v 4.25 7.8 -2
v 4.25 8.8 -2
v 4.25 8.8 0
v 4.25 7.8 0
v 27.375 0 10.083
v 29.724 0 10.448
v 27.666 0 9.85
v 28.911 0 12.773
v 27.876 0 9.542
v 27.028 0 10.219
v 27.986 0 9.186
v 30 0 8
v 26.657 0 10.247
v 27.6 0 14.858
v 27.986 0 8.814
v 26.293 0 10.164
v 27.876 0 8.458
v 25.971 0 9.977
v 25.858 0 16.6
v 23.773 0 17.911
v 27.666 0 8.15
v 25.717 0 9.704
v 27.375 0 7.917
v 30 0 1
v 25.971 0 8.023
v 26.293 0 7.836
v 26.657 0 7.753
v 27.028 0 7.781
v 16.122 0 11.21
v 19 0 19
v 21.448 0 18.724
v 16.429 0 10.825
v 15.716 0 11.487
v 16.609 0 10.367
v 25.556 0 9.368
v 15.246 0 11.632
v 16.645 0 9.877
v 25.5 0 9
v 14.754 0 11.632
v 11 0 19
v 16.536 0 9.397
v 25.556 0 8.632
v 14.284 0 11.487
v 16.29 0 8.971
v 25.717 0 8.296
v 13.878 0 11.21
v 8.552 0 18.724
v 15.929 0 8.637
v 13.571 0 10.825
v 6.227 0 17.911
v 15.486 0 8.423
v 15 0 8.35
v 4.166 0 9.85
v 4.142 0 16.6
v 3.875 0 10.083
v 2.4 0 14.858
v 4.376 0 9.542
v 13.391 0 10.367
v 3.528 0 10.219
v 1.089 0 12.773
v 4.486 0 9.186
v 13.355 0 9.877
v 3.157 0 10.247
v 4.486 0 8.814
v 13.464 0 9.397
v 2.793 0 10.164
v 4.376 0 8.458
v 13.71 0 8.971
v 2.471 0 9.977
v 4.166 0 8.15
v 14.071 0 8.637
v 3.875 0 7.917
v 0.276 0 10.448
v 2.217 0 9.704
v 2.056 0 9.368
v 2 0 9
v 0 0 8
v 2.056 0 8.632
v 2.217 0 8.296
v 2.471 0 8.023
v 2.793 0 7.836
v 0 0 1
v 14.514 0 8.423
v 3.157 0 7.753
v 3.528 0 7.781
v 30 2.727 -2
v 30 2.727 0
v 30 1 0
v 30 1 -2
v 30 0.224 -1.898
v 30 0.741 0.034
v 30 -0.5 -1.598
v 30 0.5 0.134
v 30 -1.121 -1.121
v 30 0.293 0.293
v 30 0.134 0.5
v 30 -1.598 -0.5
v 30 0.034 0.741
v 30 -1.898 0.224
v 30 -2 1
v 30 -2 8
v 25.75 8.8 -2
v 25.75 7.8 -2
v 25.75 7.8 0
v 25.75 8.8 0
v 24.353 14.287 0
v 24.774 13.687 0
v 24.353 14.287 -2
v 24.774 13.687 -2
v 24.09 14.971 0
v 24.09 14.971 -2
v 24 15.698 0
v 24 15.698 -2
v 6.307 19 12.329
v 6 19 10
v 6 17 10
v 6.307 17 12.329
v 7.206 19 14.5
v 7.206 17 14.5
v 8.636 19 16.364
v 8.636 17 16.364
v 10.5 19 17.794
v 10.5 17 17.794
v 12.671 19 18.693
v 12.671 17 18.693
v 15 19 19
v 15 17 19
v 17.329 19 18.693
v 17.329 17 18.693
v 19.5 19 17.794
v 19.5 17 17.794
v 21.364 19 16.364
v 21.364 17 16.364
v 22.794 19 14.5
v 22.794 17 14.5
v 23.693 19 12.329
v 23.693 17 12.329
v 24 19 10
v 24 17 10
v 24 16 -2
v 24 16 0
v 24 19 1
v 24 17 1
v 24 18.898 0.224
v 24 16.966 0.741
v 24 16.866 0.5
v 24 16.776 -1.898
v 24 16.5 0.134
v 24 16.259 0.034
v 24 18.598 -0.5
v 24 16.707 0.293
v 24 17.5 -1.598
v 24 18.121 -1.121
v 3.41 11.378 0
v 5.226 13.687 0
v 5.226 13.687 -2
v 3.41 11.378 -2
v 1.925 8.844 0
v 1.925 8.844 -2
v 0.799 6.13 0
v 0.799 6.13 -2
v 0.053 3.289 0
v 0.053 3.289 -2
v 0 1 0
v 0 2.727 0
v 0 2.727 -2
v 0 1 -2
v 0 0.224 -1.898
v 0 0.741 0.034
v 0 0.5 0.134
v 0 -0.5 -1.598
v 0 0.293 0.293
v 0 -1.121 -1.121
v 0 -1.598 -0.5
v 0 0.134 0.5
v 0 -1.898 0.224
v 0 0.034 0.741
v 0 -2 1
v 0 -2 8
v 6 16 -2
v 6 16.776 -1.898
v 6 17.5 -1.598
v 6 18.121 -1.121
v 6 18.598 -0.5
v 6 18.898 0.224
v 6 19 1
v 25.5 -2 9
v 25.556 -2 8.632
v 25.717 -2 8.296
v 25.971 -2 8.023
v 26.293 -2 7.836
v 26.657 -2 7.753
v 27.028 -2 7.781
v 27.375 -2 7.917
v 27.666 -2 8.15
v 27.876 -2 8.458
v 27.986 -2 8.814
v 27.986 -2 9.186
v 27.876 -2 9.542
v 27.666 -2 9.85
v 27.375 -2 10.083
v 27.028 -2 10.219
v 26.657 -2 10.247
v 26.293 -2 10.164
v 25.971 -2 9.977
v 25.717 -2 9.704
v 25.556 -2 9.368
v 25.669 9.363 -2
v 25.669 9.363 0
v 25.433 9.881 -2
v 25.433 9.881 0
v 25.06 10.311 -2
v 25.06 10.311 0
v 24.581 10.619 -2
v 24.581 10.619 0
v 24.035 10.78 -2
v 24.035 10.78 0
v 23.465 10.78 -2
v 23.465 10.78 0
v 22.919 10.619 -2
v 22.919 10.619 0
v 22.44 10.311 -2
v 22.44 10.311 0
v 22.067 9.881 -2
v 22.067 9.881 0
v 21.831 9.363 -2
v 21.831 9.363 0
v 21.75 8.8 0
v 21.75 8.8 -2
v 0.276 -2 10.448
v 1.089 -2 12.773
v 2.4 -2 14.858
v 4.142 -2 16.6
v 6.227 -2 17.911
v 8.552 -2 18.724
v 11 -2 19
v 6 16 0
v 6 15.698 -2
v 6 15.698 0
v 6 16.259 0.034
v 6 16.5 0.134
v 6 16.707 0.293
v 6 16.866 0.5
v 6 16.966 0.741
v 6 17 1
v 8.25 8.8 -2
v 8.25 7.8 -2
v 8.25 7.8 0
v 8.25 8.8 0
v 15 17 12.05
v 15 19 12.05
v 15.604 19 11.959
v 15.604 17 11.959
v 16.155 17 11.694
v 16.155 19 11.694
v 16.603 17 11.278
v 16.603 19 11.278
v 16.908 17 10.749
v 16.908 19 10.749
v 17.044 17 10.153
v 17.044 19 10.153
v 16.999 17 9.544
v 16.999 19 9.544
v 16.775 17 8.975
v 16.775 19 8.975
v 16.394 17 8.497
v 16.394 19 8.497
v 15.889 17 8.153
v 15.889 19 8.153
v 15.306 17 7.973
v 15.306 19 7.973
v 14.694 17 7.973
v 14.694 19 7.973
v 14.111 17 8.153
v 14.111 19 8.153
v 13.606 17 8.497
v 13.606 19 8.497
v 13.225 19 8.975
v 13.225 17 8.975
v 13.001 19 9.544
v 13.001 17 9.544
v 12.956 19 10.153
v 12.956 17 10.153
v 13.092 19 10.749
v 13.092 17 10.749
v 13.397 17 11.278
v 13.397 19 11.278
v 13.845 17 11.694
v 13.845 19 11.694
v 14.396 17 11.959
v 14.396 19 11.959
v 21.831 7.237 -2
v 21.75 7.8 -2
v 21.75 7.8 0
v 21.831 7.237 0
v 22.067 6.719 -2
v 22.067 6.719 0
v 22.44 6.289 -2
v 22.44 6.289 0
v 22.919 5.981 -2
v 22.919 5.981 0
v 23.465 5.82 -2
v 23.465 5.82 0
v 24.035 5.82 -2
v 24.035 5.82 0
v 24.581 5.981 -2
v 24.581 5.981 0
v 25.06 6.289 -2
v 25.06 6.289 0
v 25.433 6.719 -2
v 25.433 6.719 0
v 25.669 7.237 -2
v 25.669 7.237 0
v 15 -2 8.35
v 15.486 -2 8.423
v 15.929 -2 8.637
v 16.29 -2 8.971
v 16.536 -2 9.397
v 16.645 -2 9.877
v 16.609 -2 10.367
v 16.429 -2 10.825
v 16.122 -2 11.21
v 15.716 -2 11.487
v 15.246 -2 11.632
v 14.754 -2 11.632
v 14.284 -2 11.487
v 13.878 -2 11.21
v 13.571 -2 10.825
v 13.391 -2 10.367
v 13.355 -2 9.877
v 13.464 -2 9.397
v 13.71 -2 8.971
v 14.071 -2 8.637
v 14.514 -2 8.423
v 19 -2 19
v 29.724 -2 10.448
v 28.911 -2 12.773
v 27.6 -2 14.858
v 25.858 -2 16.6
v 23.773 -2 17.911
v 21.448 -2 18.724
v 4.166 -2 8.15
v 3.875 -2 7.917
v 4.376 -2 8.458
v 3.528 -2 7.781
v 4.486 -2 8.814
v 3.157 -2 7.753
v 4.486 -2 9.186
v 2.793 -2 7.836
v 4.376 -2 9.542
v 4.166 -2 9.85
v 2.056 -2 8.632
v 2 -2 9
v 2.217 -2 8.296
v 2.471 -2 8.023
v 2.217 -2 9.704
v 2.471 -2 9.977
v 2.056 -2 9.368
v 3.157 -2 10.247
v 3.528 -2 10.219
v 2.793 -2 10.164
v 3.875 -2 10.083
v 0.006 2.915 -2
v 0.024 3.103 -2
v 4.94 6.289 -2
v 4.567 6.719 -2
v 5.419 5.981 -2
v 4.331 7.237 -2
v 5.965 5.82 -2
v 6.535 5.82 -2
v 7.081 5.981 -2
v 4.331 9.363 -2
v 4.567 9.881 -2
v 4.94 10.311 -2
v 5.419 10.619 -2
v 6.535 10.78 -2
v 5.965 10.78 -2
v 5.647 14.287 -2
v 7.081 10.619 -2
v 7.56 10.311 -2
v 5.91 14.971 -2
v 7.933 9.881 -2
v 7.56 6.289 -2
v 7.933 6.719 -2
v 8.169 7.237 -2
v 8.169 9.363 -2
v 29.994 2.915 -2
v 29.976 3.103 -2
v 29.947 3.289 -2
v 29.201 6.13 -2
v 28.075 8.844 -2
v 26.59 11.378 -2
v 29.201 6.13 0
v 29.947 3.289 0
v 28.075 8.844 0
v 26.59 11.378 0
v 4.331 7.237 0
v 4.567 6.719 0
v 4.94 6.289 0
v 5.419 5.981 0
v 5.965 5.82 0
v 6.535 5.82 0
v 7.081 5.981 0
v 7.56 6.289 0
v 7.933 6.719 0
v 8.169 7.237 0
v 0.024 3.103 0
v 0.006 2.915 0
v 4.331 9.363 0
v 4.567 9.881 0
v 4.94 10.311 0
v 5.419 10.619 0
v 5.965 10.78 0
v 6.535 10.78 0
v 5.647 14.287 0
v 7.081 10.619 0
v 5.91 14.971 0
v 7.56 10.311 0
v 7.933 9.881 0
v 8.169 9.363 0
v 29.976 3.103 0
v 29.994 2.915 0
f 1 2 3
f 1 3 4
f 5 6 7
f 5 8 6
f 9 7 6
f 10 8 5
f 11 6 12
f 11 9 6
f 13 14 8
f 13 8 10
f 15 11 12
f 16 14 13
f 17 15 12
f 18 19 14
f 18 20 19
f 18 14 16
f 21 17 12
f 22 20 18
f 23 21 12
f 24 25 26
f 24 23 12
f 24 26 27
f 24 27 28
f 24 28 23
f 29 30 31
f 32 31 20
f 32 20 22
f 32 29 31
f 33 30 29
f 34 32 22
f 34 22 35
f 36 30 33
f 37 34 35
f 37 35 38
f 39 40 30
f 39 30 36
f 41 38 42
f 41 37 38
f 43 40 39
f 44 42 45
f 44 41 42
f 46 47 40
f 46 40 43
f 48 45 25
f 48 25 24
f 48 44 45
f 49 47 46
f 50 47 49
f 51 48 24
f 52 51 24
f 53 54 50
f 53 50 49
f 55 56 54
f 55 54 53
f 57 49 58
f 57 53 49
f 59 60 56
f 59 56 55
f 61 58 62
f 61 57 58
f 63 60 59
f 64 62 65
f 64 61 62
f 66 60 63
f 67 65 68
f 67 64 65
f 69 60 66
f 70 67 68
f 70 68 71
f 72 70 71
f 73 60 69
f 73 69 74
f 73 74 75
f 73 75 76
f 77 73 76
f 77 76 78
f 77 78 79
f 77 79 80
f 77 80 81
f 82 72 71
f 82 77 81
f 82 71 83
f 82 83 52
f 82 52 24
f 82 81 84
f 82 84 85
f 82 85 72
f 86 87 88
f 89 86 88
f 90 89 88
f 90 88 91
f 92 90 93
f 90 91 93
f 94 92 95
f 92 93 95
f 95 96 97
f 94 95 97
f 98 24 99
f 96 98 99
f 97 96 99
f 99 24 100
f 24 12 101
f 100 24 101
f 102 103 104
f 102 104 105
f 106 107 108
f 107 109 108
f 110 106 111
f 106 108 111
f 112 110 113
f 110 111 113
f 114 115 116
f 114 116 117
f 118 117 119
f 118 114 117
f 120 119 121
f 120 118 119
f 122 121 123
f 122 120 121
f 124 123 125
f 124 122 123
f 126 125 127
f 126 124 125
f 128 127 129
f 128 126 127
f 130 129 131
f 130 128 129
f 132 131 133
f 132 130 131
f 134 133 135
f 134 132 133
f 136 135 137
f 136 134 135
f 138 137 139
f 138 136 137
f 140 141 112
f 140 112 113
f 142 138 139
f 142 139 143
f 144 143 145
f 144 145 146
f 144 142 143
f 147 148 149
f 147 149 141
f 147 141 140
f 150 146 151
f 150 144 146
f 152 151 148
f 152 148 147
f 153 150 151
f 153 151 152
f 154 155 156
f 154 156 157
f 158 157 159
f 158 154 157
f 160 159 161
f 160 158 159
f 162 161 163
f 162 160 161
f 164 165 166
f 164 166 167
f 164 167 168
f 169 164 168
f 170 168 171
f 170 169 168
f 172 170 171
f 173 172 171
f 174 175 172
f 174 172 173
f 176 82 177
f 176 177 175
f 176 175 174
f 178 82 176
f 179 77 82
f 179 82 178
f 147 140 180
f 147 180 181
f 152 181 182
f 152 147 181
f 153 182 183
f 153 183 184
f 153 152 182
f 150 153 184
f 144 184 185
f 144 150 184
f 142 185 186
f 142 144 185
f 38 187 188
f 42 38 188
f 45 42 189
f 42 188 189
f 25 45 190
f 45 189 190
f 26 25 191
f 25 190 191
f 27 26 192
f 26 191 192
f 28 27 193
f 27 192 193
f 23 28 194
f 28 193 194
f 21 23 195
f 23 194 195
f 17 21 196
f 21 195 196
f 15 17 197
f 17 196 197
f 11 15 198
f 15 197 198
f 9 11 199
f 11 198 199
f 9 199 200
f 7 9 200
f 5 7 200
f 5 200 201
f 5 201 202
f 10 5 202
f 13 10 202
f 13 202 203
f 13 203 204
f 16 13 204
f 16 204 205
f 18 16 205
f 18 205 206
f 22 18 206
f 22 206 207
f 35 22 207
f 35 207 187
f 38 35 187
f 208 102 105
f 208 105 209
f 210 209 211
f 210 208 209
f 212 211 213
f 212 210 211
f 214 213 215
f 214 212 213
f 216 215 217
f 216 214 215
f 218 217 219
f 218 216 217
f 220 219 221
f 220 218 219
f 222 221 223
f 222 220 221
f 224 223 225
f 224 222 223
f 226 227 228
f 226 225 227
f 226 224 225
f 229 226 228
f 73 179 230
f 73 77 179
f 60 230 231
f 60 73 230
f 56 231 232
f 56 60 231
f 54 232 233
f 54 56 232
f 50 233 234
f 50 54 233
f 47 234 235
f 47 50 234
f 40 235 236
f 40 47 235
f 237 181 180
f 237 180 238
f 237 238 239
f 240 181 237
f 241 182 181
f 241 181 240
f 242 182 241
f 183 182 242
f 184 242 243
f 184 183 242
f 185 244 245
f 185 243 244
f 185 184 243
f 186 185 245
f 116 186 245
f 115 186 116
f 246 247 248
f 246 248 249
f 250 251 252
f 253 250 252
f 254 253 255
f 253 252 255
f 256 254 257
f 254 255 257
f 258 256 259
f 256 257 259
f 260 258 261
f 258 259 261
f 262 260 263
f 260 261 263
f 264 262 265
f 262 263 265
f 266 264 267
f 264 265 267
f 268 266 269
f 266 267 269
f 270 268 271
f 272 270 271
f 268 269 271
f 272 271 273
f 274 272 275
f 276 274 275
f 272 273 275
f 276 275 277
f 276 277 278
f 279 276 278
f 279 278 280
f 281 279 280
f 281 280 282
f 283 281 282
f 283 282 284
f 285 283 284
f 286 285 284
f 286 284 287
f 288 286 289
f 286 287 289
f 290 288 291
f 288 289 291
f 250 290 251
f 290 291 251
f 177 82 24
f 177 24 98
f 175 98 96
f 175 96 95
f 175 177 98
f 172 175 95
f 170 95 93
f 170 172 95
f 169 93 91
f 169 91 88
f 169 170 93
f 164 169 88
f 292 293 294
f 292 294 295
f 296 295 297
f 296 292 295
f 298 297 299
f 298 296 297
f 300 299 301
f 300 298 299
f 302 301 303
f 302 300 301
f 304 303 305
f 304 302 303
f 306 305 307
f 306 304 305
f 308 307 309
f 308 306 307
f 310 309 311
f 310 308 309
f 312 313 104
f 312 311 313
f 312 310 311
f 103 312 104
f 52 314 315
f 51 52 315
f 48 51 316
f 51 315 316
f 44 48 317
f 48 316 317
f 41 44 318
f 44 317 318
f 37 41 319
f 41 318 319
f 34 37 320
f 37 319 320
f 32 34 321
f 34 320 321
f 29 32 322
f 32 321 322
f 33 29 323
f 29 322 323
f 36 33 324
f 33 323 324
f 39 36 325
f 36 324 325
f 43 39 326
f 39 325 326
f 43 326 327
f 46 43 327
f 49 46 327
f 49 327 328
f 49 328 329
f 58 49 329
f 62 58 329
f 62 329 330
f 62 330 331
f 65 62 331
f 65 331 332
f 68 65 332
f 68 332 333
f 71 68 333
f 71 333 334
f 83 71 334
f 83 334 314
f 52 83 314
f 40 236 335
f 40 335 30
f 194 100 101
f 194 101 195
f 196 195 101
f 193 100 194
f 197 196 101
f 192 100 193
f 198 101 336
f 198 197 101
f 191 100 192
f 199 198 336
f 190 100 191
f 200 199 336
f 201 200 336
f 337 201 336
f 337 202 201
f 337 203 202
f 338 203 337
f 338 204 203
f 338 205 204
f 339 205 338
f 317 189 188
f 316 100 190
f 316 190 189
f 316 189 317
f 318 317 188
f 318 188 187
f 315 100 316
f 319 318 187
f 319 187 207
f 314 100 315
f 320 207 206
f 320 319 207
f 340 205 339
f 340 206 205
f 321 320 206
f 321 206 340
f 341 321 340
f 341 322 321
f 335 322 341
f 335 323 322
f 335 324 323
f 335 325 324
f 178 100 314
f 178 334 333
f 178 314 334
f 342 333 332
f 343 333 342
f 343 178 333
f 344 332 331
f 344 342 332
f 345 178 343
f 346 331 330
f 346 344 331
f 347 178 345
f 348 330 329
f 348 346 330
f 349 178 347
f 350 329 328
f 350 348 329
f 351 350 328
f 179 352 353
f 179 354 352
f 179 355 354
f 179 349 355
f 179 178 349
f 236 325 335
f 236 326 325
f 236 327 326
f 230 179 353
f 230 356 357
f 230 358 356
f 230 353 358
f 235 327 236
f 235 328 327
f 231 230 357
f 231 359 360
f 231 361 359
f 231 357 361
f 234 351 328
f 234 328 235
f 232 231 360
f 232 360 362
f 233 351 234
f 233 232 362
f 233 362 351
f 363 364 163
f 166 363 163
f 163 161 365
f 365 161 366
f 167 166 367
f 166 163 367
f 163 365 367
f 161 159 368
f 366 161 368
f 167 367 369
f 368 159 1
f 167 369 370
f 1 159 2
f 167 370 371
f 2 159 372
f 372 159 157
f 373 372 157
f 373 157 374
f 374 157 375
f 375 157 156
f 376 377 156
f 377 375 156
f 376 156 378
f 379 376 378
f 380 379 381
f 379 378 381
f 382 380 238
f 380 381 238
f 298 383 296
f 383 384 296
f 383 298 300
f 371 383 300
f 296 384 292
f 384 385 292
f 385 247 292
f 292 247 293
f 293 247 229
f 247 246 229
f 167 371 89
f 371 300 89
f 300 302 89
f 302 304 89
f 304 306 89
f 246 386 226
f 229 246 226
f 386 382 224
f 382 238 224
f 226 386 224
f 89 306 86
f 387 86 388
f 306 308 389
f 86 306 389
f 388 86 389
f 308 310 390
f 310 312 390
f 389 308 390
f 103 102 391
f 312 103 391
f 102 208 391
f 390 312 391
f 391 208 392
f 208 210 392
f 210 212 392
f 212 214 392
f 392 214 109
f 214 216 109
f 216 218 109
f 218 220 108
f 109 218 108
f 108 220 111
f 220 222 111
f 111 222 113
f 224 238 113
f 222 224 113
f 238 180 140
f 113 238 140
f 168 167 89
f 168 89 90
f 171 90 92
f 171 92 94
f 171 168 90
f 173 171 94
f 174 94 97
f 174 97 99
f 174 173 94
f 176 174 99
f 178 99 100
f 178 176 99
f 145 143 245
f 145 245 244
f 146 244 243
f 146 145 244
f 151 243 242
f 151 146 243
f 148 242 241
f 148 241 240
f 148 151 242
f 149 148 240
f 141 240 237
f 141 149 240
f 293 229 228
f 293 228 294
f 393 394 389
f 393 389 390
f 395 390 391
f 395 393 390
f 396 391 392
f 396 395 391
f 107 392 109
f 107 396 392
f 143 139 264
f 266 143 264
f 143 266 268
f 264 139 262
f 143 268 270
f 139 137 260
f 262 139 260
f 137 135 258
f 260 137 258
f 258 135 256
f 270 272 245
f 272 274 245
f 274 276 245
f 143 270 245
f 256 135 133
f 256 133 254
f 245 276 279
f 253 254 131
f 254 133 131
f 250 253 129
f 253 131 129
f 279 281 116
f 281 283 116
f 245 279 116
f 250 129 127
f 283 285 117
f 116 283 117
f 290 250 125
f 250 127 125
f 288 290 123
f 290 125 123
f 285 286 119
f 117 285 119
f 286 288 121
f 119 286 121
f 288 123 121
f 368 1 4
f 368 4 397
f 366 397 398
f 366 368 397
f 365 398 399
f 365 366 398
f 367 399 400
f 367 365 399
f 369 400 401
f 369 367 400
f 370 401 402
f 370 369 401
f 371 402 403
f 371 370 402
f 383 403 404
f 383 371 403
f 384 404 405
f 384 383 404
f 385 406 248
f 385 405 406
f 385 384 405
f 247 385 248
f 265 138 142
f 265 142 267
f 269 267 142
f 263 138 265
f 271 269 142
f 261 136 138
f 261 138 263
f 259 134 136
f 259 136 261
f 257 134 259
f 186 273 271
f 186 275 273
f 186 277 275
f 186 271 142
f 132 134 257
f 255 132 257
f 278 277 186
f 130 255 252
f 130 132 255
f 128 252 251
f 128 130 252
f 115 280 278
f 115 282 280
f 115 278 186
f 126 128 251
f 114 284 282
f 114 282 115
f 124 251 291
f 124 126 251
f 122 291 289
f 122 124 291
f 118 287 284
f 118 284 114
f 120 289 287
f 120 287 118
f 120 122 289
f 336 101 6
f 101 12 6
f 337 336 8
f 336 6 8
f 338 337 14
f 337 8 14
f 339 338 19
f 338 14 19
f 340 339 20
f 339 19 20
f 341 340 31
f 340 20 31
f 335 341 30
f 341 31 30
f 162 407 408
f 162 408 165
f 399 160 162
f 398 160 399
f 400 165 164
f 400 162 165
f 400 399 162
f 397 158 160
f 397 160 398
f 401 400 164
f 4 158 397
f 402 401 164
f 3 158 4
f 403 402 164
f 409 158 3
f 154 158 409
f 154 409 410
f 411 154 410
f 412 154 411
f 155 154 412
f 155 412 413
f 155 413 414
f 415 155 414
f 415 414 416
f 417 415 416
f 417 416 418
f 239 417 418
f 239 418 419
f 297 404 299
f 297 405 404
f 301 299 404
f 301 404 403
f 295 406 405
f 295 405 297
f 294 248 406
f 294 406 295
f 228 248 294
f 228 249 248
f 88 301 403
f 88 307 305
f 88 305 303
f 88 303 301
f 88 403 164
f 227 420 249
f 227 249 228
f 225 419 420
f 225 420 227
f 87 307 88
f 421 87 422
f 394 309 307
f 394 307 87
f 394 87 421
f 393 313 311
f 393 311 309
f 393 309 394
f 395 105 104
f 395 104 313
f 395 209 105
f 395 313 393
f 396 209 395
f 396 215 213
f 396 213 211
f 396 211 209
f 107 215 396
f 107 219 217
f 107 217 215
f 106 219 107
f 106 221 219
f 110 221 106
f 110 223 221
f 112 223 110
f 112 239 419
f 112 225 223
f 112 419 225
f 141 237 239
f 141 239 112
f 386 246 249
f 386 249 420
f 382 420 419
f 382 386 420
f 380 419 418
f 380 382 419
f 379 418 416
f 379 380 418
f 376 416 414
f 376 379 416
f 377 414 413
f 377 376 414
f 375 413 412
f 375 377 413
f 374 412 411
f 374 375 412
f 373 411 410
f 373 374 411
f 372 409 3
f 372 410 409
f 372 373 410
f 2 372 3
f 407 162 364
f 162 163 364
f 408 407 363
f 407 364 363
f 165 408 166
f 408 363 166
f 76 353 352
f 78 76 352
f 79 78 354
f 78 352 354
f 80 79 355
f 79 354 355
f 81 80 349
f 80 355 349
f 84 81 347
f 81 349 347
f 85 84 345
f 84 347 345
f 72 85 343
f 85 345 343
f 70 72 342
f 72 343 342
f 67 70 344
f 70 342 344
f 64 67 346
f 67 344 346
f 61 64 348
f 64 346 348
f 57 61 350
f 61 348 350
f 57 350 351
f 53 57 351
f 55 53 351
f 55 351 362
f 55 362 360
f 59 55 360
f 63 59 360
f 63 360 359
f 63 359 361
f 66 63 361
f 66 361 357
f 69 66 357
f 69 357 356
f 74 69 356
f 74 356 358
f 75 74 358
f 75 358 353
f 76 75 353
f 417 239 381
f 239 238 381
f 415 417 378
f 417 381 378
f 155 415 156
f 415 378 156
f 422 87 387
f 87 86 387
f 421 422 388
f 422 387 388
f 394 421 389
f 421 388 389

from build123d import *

# Parameters (mm, degrees)
BRIDA_BASE1_DEPTH                = 2
REDONDEO3MM_R                    = 3
BRIDA_DE_ARISTA1_STRIP_W         = 10
BRIDA_DE_ARISTA1_STRIP_H         = 2
BRIDA_DE_ARISTA1_STRIP_CUT_DEPTH = 30
BRIDA_DE_ARISTA1_DEPTH           = 30
BRIDA_DE_ARISTA2_STRIP_W         = 10
BRIDA_DE_ARISTA2_STRIP_H         = 2
BRIDA_DE_ARISTA2_STRIP_CUT_DEPTH = 18
BRIDA_DE_ARISTA2_DEPTH           = 18
BRIDA_START                      = 2
BRIDA_DE_ARISTA2_FLAT_DEPTH      = 2
CORTAR_EXTRUIR6_REACH            = 43.255
REDONDEO11MM_R                   = 11
TALADRO_ROSCADO_M32_D            = 2.5
TALADRO_ROSCADO_M32_DEPTH        = 20.65
TALADRO_ROSCADO_M32_TIP          = 0.751075774
CROQUIS41_R                      = 2.05
CORTAR_EXTRUIR9_DEPTH            = 2
TALADRO_ROSCADO_M41_D            = 3.3


# Sheet-metal steps are written as plain solids
with BuildPart() as part:
    # Croquis1 → Brida base1 (new body)
    with BuildSketch(Plane.XY):
        with BuildLine():
            Line((0, 0), (30, 0))
            Line((30, 0), (30, 3))
            ThreePointArc((30, 3), (27.886584846, 9.212566007), (24, 14.5))
            Line((24, 14.5), (24, 17))
            Line((24, 17), (6, 17))
            Line((6, 17), (6, 14.5))
            ThreePointArc((6, 14.5), (2.113415154, 9.212566007), (0, 3))
            Line((0, 3), (0, 0))
        make_face()
    extrude(amount=-BRIDA_BASE1_DEPTH)

    # Redondeo3mm
    redondeo3mm_edges = [part.edges().sort_by_distance(p)[0] for p in [
        (0, 3, -1),
        (6, 14.5, -1),
        (24, 14.5, -1),
        (30, 3, -1),
    ]]
    fillet(redondeo3mm_edges, radius=REDONDEO3MM_R)

    # Brida de arista1 strip (across the edge) → Brida de arista1 strip cut (cut)
    with BuildSketch(Plane.YZ):
        with Locations((-4, -1)):
            Rectangle(BRIDA_DE_ARISTA1_STRIP_W, BRIDA_DE_ARISTA1_STRIP_H)
    extrude(amount=BRIDA_DE_ARISTA1_STRIP_CUT_DEPTH, mode=Mode.SUBTRACT)

    # Brida de arista1 section (across the edge) → Brida de arista1 (add)
    with BuildSketch(Plane.YZ):
        with BuildLine():
            Line((-2, 1), (-2, 19))
            Line((-2, 19), (0, 19))
            Line((0, 19), (0, 1))
            ThreePointArc((0, 1), (0.292893219, 0.292893219), (1, 0))
            Line((1, 0), (1, -2))
            ThreePointArc((1, -2), (-1.121320344, -1.121320344), (-2, 1))
        make_face()
    extrude(amount=BRIDA_DE_ARISTA1_DEPTH)

    # Brida de arista2 strip (across the edge) → Brida de arista2 strip cut (cut)
    with BuildSketch(Plane(origin=(24, 17, 0), x_dir=(0, -1, 0), z_dir=(-1, 0, 0))):
        with Locations((-4, -1)):
            Rectangle(BRIDA_DE_ARISTA2_STRIP_W, BRIDA_DE_ARISTA2_STRIP_H)
    extrude(amount=BRIDA_DE_ARISTA2_STRIP_CUT_DEPTH, mode=Mode.SUBTRACT)

    # Brida de arista2 bend section (across the edge) → Brida de arista2 (add)
    with BuildSketch(Plane(origin=(24, 17, 0), x_dir=(0, -1, 0), z_dir=(-1, 0, 0))):
        with BuildLine():
            Line((-2, 1), (0, 1))
            ThreePointArc((0, 1), (0.292893219, 0.292893219), (1, 0))
            Line((1, 0), (1, -2))
            ThreePointArc((1, -2), (-1.121320344, -1.121320344), (-2, 1))
        make_face()
    extrude(amount=BRIDA_DE_ARISTA2_DEPTH)

    # Brida de arista2 profile (on flange) → Brida de arista2 flat (add)
    with BuildSketch(Plane(origin=(0, 17, 0), x_dir=(-1, 0, 0), z_dir=(0, 1, 0)).offset(BRIDA_START)):
        with BuildLine():
            ThreePointArc((-6, 10), (-15, 19), (-24, 10))
            Line((-24, 10), (-24, 1))
            Line((-24, 1), (-6, 1))
            Line((-6, 1), (-6, 10))
        make_face()
    extrude(amount=-BRIDA_DE_ARISTA2_FLAT_DEPTH)

    # Croquis26 → Cortar-Extruir6 (cut, up to next)
    with BuildSketch(Plane(origin=(0, 0, -2), x_dir=(-1, 0, 0), z_dir=(0, 0, -1)), mode=Mode.PRIVATE) as cortar_extruir6_sk1:
        with BuildLine():
            Line((-8.25, 7.8), (-8.25, 8.8))
            ThreePointArc((-8.25, 8.8), (-6.25, 10.8), (-4.25, 8.8))
            Line((-4.25, 8.8), (-4.25, 7.8))
            ThreePointArc((-4.25, 7.8), (-6.25, 5.8), (-8.25, 7.8))
        make_face()
    cortar_extruir6_tool1 = extrude(cortar_extruir6_sk1.sketch, amount=-CORTAR_EXTRUIR6_REACH, mode=Mode.PRIVATE) & part.part
    # Croquis26 → Cortar-Extruir6 (cut, up to next)
    with BuildSketch(Plane(origin=(0, 0, -2), x_dir=(-1, 0, 0), z_dir=(0, 0, -1)), mode=Mode.PRIVATE) as cortar_extruir6_sk2:
        with BuildLine():
            Line((-25.75, 7.8), (-25.75, 8.8))
            ThreePointArc((-25.75, 8.8), (-23.75, 10.8), (-21.75, 8.8))
            Line((-21.75, 8.8), (-21.75, 7.8))
            ThreePointArc((-21.75, 7.8), (-23.75, 5.8), (-25.75, 7.8))
        make_face()
    cortar_extruir6_tool2 = extrude(cortar_extruir6_sk2.sketch, amount=-CORTAR_EXTRUIR6_REACH, mode=Mode.PRIVATE) & part.part
    add(cortar_extruir6_tool1.solids().sort_by_distance((6.25, 8.3, -2))[0], mode=Mode.SUBTRACT)
    add(cortar_extruir6_tool2.solids().sort_by_distance((23.75, 8.3, -2))[0], mode=Mode.SUBTRACT)

    # Redondeo11mm
    redondeo11mm_edges = [part.edges().sort_by_distance(p)[0] for p in [
        (0, -1, 19),
        (30, -1, 19),
    ]]
    fillet(redondeo11mm_edges, radius=REDONDEO11MM_R)

    # Taladro roscado M32
    with Locations(Plane(origin=(0, 0, 0), x_dir=(1, 0, 0), z_dir=(0, 1, 0))):
        with Locations((3.25, -9), (26.75, -9)):
            Hole(TALADRO_ROSCADO_M32_D / 2, depth=TALADRO_ROSCADO_M32_DEPTH)
            with Locations((0, 0, -(TALADRO_ROSCADO_M32_DEPTH + TALADRO_ROSCADO_M32_TIP / 2))):  # 118° drill point
                Cone(0, TALADRO_ROSCADO_M32_D / 2, TALADRO_ROSCADO_M32_TIP, mode=Mode.SUBTRACT)

    # Croquis41 → Cortar-Extruir9 (cut)
    with BuildSketch(Plane(origin=(0, 19, 0), x_dir=(1, 0, 0), z_dir=(0, 1, 0))):
        with Locations(Location((15, -10, 0), (0, 0, 270))):
            Circle(CROQUIS41_R)
    extrude(amount=-CORTAR_EXTRUIR9_DEPTH, mode=Mode.SUBTRACT)

    # Taladro roscado M41 (through all)
    with Locations(Plane(origin=(15, 0, 10), x_dir=(0, 0, 1), z_dir=(0, 1, 0))):
        with Locations((0, 0)):
            Hole(TALADRO_ROSCADO_M41_D / 2)


solid = part.part
